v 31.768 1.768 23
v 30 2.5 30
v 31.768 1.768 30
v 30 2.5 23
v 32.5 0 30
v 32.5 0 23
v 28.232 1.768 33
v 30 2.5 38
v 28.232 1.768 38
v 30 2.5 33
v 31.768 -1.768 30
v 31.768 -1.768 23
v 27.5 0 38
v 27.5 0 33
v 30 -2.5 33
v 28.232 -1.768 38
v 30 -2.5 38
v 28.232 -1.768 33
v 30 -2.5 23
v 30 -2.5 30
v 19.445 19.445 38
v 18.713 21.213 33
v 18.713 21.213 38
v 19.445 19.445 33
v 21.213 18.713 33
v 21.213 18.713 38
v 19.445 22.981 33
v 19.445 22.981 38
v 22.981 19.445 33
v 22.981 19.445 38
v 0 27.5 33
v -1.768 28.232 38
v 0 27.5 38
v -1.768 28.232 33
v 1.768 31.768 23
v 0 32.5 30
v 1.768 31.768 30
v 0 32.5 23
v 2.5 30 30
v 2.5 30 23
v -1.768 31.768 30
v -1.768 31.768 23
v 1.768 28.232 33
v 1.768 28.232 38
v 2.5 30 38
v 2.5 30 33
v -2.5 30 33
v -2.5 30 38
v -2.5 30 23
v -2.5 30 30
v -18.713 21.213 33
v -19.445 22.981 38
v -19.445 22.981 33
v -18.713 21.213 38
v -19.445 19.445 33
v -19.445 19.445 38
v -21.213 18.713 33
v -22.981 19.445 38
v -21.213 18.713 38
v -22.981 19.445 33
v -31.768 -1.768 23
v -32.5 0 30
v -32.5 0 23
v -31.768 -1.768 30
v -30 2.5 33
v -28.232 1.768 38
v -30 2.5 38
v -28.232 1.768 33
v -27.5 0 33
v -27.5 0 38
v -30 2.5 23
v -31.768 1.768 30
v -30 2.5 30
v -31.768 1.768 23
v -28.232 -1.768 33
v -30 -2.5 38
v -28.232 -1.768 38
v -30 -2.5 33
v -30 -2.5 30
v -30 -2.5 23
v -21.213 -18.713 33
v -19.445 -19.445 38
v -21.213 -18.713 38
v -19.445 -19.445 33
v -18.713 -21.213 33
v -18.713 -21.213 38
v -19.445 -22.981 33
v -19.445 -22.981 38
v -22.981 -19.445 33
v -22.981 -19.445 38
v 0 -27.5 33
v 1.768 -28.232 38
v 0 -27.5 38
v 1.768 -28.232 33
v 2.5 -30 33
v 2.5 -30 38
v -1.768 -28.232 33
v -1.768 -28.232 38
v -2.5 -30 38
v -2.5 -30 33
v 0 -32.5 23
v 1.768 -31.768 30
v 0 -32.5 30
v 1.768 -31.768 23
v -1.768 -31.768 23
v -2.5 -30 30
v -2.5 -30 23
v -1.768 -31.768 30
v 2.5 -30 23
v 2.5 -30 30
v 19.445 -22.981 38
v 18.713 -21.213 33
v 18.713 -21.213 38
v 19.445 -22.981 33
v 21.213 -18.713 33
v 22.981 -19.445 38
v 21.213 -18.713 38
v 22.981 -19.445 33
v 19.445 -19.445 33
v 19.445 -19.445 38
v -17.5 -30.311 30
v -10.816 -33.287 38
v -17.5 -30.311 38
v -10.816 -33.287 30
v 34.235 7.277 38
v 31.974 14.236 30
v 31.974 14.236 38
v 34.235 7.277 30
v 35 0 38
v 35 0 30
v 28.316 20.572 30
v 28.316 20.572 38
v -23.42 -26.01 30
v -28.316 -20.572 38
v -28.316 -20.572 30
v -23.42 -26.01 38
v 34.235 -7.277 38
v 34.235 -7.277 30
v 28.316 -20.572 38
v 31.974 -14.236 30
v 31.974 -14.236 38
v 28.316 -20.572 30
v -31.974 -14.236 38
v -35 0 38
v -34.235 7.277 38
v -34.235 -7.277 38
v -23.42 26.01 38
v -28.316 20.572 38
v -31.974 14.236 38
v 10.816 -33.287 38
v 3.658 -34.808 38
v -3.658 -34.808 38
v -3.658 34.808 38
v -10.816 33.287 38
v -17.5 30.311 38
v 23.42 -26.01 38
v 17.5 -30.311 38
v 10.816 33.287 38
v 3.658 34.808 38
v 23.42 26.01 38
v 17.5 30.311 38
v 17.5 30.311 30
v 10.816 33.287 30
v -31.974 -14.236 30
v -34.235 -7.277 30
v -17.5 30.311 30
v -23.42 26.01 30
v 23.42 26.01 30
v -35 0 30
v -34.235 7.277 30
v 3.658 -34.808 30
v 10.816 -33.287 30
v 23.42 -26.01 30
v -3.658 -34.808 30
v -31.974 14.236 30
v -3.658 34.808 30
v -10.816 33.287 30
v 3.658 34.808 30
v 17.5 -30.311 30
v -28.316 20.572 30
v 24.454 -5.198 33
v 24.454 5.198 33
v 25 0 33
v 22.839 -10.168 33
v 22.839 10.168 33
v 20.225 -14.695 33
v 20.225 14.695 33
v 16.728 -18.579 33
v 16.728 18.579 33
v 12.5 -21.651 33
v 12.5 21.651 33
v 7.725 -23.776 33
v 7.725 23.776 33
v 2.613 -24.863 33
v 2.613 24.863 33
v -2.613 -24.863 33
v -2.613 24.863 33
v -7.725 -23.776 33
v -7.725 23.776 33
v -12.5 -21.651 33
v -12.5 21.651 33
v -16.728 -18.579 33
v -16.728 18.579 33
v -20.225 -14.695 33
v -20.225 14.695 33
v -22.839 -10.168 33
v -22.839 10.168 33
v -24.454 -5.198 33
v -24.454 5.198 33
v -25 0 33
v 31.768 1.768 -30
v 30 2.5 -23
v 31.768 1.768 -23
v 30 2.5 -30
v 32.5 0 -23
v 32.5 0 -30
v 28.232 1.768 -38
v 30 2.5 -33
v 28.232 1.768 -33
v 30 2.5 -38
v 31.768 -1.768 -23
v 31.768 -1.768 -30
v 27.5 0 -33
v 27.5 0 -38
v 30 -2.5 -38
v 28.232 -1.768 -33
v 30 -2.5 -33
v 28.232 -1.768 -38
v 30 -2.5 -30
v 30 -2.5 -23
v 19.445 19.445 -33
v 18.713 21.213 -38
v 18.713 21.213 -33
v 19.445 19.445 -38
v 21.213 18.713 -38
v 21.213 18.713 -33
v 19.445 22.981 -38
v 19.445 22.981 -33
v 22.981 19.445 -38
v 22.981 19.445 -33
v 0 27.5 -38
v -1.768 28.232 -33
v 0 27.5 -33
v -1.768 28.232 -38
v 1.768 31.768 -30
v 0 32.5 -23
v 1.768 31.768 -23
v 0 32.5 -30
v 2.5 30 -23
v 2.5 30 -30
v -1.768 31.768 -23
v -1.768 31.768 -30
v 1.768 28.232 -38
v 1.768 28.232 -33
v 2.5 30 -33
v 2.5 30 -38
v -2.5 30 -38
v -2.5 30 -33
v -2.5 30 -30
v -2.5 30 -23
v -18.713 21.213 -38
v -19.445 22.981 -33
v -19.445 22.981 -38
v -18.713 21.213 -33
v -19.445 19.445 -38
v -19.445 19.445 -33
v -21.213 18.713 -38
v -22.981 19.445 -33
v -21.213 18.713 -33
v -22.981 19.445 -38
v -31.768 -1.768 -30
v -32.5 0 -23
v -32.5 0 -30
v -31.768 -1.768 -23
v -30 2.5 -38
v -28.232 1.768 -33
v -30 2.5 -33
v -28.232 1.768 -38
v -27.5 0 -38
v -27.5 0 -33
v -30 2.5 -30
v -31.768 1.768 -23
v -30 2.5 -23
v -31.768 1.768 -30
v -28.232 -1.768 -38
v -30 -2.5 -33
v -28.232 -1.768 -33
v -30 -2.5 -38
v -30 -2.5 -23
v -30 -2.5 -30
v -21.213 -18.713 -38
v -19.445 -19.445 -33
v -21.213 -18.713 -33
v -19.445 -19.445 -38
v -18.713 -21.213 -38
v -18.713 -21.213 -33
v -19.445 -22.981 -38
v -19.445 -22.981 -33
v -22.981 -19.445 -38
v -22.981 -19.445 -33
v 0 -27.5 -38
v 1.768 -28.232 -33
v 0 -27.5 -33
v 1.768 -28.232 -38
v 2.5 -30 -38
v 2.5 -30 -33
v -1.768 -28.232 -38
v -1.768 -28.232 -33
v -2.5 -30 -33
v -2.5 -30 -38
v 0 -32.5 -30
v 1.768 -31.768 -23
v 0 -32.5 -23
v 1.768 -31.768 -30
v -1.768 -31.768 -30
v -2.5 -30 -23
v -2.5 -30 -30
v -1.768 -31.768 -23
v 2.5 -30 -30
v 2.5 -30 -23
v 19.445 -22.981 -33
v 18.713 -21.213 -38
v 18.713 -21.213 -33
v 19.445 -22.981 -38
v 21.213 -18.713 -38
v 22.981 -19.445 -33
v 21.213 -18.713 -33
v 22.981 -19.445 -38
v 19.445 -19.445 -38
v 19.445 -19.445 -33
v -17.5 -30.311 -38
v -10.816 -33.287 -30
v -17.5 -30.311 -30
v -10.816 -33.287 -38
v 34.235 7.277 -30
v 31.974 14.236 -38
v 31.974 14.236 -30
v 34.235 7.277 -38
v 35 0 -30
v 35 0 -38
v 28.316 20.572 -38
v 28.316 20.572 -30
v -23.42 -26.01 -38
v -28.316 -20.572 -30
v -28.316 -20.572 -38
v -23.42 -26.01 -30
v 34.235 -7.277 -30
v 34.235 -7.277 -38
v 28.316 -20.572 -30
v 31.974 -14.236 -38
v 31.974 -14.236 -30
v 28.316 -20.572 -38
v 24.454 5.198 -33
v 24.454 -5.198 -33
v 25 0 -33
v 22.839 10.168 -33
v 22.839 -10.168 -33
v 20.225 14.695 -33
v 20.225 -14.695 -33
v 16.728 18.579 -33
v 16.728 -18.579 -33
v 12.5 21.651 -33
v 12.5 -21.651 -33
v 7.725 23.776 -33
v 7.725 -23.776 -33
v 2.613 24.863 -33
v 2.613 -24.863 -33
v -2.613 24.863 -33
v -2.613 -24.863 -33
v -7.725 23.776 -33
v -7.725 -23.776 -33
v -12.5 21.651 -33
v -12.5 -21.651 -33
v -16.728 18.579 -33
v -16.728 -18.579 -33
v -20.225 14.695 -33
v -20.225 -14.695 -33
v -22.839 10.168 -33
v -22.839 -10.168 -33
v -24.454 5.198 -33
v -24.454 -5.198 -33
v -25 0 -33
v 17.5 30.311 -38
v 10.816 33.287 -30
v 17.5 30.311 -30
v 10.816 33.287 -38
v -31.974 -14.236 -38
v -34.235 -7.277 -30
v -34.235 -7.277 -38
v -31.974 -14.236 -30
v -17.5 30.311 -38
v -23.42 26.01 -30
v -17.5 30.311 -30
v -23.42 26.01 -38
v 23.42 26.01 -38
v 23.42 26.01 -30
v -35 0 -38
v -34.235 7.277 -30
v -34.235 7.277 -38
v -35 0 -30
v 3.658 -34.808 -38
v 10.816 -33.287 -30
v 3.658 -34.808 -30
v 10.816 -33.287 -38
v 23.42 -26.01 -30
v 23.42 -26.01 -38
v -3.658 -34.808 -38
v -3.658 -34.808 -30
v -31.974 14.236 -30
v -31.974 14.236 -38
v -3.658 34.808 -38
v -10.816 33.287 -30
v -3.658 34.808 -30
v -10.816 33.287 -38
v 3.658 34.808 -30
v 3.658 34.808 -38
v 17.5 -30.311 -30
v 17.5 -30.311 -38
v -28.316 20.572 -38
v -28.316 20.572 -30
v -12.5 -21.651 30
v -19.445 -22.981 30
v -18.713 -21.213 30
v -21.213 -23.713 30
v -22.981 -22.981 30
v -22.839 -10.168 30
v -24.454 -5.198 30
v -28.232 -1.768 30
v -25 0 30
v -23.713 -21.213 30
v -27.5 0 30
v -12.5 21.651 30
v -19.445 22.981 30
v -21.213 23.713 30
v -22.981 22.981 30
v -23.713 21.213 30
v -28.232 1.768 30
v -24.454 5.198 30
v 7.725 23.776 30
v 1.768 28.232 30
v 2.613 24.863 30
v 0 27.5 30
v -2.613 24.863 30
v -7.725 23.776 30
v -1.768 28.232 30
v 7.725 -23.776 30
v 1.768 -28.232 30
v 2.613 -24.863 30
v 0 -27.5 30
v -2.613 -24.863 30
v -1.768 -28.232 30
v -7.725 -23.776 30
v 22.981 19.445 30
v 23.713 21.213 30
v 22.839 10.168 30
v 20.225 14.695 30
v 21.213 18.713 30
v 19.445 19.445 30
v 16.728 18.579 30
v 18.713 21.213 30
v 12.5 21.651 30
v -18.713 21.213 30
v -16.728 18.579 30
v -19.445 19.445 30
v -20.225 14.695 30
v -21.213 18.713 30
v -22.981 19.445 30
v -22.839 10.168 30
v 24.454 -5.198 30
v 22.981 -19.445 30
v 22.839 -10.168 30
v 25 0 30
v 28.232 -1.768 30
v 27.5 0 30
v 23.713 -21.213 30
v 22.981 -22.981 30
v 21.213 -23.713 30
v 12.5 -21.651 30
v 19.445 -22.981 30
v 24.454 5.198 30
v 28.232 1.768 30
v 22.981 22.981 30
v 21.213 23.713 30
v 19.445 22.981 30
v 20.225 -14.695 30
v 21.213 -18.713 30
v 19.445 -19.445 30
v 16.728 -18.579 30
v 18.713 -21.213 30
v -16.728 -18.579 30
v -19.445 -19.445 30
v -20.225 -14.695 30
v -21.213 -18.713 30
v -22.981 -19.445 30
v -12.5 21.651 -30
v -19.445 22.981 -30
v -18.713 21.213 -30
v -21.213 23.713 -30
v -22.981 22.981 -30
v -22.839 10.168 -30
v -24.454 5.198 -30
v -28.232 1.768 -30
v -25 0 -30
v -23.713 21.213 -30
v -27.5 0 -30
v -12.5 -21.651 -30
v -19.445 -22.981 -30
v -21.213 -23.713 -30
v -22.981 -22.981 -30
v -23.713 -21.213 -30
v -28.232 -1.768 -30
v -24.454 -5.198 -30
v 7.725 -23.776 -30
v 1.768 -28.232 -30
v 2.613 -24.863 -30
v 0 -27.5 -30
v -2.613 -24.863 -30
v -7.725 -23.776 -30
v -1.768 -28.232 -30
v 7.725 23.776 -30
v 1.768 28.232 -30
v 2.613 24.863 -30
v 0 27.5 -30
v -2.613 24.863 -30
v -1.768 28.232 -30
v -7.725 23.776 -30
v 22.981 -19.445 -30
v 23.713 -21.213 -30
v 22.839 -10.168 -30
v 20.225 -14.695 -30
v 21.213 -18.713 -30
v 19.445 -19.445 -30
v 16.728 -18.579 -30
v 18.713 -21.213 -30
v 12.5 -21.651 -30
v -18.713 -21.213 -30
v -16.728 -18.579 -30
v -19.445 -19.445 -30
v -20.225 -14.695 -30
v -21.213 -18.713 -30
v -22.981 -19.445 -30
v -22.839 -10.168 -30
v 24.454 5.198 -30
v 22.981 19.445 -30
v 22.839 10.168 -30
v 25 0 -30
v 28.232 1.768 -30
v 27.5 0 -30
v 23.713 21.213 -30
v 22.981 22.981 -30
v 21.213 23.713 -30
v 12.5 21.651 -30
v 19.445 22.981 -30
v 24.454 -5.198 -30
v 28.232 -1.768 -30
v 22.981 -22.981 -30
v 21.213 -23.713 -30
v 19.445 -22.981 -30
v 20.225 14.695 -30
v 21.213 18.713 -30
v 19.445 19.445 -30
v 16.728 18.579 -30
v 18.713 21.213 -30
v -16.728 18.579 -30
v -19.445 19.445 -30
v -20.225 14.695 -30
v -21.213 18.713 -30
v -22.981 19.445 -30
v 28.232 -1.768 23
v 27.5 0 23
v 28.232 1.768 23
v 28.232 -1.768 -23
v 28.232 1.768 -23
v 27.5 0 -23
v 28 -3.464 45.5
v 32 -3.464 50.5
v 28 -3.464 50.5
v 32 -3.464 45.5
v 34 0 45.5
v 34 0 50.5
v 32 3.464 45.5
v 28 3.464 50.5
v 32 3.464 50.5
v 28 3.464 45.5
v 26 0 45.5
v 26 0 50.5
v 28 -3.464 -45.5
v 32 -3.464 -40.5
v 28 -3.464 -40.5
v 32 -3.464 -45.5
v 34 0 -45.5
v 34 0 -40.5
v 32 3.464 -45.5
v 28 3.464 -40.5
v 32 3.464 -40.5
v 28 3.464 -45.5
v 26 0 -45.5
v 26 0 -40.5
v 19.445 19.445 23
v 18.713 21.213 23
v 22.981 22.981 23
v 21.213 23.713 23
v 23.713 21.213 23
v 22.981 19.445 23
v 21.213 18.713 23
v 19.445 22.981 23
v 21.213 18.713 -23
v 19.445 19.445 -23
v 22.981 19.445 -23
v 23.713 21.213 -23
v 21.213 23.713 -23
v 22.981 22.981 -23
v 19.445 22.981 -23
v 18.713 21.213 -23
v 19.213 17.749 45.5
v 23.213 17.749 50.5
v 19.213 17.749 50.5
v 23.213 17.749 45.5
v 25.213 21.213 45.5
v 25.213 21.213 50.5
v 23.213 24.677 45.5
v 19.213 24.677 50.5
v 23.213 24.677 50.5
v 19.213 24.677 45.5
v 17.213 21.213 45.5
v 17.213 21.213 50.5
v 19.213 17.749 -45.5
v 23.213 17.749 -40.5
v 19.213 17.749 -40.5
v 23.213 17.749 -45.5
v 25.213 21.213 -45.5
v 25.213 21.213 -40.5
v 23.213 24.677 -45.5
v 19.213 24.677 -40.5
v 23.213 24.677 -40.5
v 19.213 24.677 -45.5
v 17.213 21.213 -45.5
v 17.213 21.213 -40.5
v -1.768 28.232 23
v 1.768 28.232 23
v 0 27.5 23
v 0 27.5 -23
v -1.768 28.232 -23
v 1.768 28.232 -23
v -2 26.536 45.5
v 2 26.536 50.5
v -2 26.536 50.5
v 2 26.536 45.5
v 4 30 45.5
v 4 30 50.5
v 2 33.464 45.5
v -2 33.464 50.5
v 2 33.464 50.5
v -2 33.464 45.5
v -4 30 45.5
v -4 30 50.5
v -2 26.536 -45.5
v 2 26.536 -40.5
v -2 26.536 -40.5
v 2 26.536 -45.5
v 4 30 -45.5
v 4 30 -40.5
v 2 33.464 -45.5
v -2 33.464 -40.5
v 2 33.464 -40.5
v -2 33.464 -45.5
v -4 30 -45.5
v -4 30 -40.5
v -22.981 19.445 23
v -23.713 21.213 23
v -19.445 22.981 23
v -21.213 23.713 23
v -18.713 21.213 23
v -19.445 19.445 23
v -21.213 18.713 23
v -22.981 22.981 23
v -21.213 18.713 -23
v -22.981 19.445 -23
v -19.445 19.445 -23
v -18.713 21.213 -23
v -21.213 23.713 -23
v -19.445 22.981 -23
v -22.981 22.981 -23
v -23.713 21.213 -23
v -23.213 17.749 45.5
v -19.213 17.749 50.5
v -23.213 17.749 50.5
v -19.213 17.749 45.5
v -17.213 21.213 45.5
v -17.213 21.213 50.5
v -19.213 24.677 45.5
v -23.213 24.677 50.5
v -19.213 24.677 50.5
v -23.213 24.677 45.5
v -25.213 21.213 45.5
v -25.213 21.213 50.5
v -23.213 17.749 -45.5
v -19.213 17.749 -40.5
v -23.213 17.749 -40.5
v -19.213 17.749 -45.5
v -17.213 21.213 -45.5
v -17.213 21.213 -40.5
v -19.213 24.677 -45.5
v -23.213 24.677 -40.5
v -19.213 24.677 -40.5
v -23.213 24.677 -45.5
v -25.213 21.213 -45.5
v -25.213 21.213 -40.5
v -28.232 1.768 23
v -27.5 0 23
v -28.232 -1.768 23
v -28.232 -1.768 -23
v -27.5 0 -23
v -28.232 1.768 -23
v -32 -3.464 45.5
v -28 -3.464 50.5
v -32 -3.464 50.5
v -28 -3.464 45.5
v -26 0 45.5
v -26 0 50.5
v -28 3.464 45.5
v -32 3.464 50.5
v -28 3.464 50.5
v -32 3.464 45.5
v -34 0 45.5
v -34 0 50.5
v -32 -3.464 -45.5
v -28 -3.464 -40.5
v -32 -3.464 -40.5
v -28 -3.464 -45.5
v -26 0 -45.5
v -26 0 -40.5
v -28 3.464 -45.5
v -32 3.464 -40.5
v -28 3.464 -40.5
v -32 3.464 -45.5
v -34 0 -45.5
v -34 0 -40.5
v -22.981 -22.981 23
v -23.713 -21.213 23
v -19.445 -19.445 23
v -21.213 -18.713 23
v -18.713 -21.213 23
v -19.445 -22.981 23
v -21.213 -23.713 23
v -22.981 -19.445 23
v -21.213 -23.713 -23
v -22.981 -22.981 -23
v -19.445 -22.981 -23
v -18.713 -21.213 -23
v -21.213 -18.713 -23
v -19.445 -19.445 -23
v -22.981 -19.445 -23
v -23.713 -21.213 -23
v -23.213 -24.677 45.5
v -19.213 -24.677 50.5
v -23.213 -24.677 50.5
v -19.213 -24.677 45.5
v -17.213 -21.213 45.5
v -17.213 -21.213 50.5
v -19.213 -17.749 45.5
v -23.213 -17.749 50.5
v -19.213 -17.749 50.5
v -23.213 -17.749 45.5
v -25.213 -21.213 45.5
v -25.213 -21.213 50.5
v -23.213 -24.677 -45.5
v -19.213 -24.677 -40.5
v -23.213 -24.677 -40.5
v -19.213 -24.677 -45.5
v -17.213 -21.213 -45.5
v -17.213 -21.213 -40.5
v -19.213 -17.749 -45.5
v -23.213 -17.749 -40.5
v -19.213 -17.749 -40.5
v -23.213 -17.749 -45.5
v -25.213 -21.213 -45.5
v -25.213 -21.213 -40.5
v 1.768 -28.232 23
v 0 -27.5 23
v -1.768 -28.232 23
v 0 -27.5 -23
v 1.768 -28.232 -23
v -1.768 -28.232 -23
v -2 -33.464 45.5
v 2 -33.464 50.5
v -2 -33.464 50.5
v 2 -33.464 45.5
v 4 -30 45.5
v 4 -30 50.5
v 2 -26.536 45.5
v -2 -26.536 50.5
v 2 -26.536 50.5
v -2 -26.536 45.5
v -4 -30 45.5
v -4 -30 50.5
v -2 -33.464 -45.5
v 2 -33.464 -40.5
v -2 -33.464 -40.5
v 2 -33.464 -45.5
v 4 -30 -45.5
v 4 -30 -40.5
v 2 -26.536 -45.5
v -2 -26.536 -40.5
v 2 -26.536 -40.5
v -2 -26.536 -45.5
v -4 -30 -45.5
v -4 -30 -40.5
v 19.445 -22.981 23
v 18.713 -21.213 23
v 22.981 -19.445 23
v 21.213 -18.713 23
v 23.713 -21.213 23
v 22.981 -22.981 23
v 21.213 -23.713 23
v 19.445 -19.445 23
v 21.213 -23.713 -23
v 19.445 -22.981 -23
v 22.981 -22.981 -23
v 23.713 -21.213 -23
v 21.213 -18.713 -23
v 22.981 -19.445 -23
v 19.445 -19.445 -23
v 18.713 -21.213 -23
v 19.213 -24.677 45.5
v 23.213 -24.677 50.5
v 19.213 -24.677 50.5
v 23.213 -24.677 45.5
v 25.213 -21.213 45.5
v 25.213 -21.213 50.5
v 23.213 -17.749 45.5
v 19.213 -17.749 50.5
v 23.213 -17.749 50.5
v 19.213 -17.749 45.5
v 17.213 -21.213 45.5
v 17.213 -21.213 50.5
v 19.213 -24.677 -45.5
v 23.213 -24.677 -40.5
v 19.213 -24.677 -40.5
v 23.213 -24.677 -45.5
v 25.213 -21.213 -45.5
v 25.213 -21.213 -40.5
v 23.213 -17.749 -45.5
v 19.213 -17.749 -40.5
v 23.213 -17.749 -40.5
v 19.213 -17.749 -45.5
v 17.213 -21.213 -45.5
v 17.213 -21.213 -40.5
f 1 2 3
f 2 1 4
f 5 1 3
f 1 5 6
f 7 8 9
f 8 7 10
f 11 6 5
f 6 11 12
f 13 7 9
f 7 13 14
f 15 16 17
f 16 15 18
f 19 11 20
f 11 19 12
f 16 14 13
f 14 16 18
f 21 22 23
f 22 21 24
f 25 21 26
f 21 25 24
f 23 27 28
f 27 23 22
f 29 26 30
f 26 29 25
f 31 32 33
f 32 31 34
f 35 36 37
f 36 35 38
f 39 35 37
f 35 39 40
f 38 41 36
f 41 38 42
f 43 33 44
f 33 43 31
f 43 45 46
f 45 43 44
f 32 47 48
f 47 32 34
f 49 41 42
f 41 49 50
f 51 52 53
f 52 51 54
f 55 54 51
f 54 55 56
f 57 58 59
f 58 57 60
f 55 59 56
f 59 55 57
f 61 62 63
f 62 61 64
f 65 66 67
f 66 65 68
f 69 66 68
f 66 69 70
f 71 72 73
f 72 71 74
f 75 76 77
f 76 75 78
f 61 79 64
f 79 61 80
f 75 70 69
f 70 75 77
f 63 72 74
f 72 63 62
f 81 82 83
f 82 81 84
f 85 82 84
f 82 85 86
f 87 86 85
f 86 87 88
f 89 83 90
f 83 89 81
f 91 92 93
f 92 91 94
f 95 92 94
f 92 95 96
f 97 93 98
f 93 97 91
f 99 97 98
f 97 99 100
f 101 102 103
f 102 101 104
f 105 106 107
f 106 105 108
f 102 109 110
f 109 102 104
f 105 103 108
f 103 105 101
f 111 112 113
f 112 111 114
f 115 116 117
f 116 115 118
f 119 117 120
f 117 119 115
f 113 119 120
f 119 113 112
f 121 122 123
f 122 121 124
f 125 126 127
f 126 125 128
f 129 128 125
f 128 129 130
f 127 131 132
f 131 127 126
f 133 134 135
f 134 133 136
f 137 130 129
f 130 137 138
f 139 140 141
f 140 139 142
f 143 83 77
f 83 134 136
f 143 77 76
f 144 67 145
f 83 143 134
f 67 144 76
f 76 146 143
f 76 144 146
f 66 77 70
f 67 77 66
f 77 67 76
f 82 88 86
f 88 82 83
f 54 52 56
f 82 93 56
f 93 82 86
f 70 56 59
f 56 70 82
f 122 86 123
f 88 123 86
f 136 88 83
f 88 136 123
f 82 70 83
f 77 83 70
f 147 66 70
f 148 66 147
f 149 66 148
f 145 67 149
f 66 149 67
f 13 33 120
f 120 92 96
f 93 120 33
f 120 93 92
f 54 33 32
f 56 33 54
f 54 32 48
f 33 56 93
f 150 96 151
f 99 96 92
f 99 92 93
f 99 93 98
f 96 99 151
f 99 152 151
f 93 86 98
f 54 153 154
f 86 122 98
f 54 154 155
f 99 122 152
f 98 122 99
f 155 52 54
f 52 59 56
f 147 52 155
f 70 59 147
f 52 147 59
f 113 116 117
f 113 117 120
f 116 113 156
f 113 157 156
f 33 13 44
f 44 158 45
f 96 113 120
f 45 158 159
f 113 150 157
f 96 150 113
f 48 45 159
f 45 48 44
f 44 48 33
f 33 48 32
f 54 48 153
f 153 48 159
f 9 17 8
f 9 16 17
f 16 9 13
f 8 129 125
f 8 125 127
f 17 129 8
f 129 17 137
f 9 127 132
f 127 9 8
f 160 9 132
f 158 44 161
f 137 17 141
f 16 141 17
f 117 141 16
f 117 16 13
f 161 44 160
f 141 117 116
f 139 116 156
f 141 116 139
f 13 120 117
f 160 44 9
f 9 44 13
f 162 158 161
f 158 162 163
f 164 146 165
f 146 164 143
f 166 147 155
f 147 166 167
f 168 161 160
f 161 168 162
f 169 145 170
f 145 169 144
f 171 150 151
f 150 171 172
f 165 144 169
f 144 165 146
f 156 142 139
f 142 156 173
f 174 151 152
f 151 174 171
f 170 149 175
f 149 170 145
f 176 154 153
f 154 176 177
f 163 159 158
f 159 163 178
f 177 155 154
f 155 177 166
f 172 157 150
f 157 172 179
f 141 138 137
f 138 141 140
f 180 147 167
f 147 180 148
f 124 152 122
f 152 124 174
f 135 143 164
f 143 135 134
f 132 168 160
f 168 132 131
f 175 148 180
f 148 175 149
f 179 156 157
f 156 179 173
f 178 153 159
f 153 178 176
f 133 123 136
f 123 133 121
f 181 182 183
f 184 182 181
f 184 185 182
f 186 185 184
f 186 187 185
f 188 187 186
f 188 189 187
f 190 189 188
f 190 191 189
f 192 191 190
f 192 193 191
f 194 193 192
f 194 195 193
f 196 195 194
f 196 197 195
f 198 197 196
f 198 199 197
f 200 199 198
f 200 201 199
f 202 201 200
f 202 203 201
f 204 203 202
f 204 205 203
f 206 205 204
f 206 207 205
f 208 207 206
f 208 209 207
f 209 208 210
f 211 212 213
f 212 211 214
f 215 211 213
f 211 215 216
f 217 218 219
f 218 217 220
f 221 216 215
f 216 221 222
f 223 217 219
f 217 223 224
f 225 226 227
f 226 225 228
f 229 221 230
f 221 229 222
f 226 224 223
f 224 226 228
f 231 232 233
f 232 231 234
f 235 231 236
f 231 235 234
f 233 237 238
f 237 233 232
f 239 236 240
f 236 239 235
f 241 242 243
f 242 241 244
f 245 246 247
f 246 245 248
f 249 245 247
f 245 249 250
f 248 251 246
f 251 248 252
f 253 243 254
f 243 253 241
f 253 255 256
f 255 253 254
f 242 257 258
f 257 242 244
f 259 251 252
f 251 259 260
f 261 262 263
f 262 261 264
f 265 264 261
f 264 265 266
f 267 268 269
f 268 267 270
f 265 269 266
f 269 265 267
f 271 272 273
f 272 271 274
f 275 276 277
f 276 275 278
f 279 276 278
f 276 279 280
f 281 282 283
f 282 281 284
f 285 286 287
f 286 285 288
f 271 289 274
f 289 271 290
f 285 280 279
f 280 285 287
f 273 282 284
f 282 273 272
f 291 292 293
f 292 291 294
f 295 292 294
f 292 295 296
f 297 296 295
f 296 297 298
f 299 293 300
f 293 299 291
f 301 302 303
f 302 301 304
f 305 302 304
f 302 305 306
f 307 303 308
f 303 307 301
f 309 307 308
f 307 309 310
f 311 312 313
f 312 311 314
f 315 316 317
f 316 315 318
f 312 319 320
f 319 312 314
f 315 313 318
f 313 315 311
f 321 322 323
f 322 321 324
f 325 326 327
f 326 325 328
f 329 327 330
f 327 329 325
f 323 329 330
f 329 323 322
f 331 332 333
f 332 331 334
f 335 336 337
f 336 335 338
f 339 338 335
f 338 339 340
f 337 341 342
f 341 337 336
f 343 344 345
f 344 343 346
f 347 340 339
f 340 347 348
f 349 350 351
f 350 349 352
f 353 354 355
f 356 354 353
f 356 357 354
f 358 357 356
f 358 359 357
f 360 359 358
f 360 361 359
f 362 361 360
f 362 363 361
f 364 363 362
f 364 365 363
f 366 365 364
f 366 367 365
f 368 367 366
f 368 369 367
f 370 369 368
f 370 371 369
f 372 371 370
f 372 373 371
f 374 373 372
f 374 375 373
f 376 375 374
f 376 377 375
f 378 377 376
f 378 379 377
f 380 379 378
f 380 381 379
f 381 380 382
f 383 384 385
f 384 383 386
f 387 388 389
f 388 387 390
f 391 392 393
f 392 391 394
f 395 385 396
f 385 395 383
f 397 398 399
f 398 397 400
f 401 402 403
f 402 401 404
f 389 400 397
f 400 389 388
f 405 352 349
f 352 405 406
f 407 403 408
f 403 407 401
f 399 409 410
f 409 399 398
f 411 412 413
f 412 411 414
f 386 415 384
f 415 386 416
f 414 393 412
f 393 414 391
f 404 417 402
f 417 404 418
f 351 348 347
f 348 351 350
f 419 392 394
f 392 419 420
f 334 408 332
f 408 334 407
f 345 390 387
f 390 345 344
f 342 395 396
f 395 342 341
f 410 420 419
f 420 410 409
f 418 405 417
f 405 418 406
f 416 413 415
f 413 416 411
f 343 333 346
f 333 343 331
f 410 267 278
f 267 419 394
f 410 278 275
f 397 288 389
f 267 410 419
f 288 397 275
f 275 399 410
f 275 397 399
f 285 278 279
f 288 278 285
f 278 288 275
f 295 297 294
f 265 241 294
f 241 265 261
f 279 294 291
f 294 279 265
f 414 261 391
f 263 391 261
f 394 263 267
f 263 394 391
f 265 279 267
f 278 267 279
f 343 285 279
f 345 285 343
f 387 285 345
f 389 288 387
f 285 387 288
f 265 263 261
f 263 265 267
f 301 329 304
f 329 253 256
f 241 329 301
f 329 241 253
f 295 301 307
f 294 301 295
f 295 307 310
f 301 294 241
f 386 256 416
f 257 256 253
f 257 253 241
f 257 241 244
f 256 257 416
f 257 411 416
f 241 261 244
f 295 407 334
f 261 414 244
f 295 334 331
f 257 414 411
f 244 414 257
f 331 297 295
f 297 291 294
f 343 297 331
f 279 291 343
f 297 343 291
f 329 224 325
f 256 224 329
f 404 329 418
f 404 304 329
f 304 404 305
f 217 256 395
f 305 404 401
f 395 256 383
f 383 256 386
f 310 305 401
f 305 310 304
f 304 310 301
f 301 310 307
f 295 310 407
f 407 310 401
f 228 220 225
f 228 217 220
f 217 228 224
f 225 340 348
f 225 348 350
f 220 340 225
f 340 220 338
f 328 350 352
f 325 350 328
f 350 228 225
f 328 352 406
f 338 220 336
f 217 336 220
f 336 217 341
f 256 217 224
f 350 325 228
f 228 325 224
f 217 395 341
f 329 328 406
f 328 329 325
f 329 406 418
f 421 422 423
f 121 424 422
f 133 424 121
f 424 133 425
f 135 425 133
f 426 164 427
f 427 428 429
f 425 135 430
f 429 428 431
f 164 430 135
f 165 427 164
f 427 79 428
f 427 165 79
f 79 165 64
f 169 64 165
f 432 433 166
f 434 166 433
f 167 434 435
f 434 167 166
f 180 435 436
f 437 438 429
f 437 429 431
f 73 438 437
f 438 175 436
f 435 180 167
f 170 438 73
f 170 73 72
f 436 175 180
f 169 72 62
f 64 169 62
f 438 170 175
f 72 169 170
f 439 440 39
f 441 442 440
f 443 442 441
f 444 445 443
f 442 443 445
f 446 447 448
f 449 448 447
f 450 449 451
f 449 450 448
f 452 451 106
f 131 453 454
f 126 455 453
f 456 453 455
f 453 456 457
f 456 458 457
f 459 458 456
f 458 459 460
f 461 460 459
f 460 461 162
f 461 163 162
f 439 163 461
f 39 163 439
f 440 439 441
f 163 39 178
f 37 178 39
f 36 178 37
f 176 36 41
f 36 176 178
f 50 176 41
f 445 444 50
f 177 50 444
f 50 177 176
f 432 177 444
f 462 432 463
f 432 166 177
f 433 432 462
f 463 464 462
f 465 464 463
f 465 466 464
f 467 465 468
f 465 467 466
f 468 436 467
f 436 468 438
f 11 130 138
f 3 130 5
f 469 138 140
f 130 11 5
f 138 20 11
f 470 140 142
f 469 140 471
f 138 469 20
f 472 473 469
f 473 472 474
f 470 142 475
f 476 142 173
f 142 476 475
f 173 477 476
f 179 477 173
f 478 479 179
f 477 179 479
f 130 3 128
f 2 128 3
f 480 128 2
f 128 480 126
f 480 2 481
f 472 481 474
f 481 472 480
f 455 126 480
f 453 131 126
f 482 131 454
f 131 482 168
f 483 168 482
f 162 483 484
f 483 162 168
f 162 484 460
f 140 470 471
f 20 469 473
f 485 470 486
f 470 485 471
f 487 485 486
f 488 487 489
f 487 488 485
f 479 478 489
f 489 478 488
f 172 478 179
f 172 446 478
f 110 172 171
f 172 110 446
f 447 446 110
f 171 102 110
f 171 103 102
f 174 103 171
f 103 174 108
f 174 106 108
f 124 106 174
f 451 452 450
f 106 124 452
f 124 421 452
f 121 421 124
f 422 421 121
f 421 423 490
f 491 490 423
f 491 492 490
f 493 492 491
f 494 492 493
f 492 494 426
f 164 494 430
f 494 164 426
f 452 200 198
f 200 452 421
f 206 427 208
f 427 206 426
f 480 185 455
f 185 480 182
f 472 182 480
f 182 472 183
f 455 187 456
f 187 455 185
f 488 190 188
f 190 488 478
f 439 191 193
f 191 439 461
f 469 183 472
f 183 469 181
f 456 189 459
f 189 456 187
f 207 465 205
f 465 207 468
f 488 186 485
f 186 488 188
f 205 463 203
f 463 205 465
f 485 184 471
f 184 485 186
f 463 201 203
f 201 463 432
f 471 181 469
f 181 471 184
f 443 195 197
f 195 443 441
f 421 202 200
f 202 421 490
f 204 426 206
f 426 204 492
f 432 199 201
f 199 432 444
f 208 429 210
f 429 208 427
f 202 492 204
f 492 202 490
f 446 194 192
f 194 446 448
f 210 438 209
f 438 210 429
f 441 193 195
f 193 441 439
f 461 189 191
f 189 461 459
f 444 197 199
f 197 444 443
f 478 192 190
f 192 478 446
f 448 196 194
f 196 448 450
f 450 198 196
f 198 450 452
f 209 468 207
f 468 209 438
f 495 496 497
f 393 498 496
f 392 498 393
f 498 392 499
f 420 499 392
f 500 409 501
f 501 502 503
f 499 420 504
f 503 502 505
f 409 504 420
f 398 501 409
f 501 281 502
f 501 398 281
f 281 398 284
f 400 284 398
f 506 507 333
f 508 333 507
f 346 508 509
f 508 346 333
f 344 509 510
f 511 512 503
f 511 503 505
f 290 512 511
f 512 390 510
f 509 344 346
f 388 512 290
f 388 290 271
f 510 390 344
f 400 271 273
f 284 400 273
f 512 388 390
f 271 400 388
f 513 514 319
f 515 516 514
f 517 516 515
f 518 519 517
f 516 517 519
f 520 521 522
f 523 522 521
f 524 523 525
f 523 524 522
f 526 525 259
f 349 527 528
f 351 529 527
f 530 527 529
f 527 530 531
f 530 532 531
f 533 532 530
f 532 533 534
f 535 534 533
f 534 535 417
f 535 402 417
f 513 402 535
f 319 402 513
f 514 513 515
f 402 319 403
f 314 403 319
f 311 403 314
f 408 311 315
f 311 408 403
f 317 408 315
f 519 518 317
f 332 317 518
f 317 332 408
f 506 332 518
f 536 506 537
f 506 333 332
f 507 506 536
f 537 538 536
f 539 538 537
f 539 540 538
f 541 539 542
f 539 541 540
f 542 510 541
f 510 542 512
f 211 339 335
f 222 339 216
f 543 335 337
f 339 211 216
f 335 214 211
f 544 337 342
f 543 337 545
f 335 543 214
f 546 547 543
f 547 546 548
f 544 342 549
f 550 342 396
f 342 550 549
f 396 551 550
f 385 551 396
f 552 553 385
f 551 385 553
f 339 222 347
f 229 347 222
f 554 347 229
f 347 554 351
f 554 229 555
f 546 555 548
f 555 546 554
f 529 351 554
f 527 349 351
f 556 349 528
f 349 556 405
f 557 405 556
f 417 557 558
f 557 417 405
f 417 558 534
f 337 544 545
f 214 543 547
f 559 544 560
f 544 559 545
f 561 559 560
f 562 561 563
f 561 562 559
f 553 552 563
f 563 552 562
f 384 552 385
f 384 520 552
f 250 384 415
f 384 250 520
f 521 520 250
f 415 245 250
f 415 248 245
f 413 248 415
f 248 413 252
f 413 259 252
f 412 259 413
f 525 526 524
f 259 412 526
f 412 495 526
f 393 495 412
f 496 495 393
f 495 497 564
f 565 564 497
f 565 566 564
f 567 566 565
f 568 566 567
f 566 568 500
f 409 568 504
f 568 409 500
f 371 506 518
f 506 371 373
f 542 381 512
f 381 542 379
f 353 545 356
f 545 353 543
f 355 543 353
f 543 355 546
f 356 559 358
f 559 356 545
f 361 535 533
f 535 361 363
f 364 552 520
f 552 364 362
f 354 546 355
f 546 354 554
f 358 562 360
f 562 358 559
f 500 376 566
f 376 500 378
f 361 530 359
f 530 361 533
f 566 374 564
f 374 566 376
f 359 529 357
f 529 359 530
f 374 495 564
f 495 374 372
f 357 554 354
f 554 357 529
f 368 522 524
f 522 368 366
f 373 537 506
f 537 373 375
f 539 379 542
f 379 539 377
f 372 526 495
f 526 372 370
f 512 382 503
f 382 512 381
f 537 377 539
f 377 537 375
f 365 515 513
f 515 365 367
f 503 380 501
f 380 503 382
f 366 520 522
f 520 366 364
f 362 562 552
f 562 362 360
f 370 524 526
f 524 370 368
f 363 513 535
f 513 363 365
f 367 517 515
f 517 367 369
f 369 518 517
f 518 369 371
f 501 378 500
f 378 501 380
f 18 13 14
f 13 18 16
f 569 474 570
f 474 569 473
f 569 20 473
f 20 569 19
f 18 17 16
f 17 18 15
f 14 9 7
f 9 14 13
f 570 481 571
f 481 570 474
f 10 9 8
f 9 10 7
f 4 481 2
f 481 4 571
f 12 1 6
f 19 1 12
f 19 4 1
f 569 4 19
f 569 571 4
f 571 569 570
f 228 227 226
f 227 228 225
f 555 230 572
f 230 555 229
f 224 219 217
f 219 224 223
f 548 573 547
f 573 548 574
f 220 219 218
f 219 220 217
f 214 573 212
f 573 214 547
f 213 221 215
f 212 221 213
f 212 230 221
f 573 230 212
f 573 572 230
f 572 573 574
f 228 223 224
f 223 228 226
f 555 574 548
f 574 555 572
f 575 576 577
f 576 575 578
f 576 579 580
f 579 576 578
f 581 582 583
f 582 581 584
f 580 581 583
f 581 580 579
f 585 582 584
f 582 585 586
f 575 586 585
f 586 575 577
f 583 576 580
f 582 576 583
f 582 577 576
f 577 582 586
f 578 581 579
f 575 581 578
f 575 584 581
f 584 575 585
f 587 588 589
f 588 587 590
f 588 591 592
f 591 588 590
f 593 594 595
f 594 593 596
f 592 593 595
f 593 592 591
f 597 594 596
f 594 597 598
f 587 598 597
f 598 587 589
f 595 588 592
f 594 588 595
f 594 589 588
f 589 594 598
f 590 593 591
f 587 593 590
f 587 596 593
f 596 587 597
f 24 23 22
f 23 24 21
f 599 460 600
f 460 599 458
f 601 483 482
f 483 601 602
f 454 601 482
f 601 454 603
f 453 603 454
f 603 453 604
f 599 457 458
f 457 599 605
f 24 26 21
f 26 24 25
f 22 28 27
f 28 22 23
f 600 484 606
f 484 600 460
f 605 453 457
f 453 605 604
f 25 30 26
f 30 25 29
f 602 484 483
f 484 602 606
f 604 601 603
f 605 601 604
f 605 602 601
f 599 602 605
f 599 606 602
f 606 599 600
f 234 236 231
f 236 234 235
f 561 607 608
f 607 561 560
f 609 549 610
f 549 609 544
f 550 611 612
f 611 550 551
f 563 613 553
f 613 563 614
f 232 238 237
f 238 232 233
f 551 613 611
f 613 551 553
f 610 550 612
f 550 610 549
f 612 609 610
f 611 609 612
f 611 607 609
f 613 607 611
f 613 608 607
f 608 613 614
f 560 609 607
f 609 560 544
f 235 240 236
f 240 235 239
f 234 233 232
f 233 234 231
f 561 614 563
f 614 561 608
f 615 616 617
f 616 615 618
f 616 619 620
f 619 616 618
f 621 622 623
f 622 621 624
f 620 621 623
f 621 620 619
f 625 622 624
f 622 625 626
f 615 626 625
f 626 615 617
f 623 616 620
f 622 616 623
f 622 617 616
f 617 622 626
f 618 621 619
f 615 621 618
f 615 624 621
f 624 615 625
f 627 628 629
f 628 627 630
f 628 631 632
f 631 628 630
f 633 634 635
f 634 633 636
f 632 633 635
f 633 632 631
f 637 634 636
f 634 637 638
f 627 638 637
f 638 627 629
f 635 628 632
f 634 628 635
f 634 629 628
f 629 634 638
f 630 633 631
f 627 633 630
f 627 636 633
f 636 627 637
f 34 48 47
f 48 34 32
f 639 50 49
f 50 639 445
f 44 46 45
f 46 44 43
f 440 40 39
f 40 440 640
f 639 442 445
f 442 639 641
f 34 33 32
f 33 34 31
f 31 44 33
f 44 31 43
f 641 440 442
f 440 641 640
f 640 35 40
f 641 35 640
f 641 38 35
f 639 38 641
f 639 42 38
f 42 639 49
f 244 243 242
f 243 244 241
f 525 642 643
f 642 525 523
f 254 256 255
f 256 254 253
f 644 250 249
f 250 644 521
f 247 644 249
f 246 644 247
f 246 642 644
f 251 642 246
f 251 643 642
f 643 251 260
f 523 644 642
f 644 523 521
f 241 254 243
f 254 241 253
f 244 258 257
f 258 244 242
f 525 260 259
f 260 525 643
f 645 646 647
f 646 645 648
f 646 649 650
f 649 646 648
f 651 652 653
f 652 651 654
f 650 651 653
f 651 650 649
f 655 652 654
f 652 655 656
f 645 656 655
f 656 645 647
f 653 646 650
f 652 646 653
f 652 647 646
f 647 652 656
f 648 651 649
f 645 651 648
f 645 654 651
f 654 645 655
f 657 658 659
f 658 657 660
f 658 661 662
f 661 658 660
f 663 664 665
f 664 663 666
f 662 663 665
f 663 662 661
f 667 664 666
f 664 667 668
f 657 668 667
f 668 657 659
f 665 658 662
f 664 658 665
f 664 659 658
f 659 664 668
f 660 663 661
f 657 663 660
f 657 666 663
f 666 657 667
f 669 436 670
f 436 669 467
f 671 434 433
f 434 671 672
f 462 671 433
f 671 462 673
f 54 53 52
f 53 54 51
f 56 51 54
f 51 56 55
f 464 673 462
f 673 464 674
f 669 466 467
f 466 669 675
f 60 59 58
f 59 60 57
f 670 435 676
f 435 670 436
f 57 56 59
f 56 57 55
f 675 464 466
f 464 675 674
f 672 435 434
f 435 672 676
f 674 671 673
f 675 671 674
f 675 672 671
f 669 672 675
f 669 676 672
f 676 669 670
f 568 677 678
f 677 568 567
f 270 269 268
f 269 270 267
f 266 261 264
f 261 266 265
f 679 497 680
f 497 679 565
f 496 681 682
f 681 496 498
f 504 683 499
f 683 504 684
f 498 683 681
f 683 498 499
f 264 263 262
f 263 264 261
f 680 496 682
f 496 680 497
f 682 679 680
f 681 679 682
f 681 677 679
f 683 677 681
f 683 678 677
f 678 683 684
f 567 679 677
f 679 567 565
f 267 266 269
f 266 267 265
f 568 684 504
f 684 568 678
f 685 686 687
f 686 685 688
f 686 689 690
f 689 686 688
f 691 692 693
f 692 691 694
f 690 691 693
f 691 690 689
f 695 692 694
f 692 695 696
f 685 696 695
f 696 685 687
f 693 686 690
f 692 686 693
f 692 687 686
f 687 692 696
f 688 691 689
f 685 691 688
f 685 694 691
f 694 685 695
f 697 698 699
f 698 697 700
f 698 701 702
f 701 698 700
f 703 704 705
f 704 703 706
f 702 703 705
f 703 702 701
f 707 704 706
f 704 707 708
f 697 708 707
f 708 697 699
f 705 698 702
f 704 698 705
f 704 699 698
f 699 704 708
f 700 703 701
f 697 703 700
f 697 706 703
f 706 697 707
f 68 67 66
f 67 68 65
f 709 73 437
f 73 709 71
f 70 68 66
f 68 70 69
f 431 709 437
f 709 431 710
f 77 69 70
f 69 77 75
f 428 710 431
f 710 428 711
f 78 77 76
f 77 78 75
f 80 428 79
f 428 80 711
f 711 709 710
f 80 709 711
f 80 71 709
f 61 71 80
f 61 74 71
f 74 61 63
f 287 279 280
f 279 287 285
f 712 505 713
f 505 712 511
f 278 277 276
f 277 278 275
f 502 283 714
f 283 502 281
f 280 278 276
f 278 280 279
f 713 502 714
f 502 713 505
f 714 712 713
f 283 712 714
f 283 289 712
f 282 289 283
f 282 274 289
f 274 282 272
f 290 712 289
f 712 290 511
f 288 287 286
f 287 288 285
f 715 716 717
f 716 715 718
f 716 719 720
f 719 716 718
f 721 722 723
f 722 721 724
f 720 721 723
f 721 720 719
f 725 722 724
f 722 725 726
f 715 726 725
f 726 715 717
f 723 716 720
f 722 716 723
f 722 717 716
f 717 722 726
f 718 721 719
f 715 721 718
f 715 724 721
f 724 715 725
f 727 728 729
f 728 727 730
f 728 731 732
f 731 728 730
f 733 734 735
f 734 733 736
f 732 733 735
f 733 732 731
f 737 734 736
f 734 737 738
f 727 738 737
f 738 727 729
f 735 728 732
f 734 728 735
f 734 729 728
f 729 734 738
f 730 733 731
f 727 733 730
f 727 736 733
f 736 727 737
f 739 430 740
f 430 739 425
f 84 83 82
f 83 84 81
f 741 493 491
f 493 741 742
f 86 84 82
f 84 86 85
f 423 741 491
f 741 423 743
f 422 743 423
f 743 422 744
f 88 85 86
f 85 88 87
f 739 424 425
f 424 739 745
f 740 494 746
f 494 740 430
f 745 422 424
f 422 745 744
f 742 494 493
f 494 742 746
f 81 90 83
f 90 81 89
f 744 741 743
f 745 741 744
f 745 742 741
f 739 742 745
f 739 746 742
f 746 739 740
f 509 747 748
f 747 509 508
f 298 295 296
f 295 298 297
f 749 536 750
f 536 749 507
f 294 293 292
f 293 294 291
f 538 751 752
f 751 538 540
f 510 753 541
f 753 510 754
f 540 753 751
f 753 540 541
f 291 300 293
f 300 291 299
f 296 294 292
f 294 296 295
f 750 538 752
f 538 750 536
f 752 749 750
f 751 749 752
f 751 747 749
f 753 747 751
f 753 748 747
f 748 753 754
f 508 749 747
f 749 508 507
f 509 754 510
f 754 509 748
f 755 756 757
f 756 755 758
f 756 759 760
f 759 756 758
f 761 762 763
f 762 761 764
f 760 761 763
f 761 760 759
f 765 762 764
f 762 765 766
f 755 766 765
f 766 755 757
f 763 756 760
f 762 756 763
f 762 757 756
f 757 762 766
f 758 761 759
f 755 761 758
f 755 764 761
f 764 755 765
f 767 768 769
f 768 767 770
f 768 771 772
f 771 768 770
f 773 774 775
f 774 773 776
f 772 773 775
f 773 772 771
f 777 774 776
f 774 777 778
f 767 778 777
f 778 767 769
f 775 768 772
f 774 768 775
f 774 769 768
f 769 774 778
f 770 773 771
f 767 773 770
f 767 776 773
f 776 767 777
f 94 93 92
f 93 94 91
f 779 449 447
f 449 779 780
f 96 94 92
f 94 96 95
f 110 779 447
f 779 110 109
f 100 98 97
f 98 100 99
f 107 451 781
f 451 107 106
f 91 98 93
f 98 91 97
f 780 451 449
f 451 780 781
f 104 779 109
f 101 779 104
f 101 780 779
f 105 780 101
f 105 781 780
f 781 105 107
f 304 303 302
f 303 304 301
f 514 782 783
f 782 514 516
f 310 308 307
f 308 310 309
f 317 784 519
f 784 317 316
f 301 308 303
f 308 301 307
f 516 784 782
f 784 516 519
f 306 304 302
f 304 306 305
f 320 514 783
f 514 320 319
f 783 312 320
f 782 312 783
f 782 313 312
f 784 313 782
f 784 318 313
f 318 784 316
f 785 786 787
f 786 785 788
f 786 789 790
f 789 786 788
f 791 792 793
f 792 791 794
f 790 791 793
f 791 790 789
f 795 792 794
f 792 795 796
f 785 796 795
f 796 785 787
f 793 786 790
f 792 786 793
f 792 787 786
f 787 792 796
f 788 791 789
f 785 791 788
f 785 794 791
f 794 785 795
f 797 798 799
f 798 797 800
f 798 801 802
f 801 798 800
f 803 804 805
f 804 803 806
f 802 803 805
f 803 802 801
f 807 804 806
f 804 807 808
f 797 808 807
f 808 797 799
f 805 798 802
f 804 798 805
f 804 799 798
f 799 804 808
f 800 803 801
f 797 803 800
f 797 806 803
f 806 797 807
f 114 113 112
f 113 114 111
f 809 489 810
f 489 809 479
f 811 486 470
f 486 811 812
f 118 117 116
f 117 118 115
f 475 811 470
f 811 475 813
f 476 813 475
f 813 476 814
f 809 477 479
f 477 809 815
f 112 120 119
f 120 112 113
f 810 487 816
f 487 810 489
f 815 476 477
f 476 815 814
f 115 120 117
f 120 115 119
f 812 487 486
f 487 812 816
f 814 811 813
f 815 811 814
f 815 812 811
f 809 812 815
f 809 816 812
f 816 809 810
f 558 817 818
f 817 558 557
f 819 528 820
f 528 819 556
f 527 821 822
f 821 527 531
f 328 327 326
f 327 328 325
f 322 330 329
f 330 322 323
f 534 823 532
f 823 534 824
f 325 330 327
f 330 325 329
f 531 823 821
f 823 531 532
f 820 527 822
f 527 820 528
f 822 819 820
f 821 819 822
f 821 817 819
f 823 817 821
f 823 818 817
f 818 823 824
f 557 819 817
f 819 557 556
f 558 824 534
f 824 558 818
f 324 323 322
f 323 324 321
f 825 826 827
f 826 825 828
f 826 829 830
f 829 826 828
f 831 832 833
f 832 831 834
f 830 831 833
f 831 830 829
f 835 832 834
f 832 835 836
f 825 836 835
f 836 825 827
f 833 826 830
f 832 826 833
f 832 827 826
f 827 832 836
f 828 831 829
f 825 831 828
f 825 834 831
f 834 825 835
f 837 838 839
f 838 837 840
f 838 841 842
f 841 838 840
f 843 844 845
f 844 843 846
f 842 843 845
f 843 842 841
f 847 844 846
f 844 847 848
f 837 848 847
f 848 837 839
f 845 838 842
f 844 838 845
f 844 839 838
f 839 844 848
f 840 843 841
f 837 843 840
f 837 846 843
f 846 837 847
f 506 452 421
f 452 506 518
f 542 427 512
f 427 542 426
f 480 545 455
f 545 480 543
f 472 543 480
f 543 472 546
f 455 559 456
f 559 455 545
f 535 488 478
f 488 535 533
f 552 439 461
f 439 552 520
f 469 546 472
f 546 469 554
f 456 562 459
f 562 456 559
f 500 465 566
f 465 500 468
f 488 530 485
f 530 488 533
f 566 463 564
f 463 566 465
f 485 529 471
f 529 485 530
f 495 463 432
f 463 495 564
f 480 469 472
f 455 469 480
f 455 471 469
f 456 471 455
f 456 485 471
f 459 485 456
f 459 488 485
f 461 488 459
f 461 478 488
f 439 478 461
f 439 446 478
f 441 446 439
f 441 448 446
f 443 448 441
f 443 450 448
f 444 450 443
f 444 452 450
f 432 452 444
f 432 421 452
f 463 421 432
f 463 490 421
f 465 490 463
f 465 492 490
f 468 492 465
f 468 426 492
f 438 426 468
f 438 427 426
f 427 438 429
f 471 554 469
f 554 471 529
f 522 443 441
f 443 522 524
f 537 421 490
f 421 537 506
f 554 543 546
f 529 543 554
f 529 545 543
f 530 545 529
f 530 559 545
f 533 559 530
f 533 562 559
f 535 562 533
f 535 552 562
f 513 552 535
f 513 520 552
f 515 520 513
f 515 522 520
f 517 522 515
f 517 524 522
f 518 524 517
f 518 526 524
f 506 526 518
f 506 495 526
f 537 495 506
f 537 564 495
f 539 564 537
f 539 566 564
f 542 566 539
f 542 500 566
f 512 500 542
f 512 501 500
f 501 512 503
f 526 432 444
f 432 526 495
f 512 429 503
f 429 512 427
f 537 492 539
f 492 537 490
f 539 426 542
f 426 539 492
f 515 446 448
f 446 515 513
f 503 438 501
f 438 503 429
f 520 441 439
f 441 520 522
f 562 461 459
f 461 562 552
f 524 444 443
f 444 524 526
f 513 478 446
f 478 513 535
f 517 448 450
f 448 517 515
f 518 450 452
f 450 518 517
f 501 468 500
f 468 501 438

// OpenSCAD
// Parameters
central_cylinder_diameter = 50;
central_cylinder_length = 60;
flange_diameter = 70;
flange_thickness = 5;
spacer_ring_thickness = 3;
bolt_diameter = 5;
bolt_length = 15;
nut_diameter = 8;
num_bolts = 8;
bolt_circle_radius = 30;

// Function to position bolts in a circular pattern
module bolt_positions() {
    for (i = [0:num_bolts-1]) {
        angle = i * 360 / num_bolts;
        translate([bolt_circle_radius * cos(angle), bolt_circle_radius * sin(angle), 0])
            children();
    }
}

// Central Cylinder
module central_cylinder() {
    cylinder(d=central_cylinder_diameter, h=central_cylinder_length, center=true);
}

// Flange Plate
module flange_plate() {
    difference() {
        cylinder(d=flange_diameter, h=flange_thickness, center=true);
        // Bolt holes
        bolt_positions() {
            cylinder(d=bolt_diameter, h=flange_thickness+2, center=true);
        }
    }
}

// Spacer Ring
module spacer_ring() {
    difference() {
        cylinder(d=flange_diameter, h=spacer_ring_thickness, center=true);
        cylinder(d=central_cylinder_diameter, h=spacer_ring_thickness+2, center=true);
    }
}

// Bolt
module bolt() {
    translate([0, 0, -bolt_length/2])
        cylinder(d=bolt_diameter, h=bolt_length, center=true);
}

// Nut
module nut() {
    cylinder(d=nut_diameter, h=5, $fn=6);
}

// Assembly
module coupling() {
    // Central Cylinder
    central_cylinder();
    
    // Flange Plates
    translate([0, 0, central_cylinder_length/2 + spacer_ring_thickness + flange_thickness/2])
        flange_plate();
    translate([0, 0, -central_cylinder_length/2 - spacer_ring_thickness - flange_thickness/2])
        flange_plate();
    
    // Spacer Rings
    translate([0, 0, central_cylinder_length/2 + spacer_ring_thickness/2])
        spacer_ring();
    translate([0, 0, -central_cylinder_length/2 - spacer_ring_thickness/2])
        spacer_ring();
    
    // Bolts and Nuts
    bolt_positions() {
        translate([0, 0, central_cylinder_length/2 + spacer_ring_thickness + flange_thickness])
            bolt();
        translate([0, 0, -central_cylinder_length/2 - spacer_ring_thickness - flange_thickness])
            rotate([0, 180, 0]) bolt();
        
        translate([0, 0, central_cylinder_length/2 + spacer_ring_thickness + flange_thickness + bolt_length/2])
            nut();
        translate([0, 0, -central_cylinder_length/2 - spacer_ring_thickness - flange_thickness - bolt_length/2])
            nut();
    }
}

// Render the coupling
coupling();
